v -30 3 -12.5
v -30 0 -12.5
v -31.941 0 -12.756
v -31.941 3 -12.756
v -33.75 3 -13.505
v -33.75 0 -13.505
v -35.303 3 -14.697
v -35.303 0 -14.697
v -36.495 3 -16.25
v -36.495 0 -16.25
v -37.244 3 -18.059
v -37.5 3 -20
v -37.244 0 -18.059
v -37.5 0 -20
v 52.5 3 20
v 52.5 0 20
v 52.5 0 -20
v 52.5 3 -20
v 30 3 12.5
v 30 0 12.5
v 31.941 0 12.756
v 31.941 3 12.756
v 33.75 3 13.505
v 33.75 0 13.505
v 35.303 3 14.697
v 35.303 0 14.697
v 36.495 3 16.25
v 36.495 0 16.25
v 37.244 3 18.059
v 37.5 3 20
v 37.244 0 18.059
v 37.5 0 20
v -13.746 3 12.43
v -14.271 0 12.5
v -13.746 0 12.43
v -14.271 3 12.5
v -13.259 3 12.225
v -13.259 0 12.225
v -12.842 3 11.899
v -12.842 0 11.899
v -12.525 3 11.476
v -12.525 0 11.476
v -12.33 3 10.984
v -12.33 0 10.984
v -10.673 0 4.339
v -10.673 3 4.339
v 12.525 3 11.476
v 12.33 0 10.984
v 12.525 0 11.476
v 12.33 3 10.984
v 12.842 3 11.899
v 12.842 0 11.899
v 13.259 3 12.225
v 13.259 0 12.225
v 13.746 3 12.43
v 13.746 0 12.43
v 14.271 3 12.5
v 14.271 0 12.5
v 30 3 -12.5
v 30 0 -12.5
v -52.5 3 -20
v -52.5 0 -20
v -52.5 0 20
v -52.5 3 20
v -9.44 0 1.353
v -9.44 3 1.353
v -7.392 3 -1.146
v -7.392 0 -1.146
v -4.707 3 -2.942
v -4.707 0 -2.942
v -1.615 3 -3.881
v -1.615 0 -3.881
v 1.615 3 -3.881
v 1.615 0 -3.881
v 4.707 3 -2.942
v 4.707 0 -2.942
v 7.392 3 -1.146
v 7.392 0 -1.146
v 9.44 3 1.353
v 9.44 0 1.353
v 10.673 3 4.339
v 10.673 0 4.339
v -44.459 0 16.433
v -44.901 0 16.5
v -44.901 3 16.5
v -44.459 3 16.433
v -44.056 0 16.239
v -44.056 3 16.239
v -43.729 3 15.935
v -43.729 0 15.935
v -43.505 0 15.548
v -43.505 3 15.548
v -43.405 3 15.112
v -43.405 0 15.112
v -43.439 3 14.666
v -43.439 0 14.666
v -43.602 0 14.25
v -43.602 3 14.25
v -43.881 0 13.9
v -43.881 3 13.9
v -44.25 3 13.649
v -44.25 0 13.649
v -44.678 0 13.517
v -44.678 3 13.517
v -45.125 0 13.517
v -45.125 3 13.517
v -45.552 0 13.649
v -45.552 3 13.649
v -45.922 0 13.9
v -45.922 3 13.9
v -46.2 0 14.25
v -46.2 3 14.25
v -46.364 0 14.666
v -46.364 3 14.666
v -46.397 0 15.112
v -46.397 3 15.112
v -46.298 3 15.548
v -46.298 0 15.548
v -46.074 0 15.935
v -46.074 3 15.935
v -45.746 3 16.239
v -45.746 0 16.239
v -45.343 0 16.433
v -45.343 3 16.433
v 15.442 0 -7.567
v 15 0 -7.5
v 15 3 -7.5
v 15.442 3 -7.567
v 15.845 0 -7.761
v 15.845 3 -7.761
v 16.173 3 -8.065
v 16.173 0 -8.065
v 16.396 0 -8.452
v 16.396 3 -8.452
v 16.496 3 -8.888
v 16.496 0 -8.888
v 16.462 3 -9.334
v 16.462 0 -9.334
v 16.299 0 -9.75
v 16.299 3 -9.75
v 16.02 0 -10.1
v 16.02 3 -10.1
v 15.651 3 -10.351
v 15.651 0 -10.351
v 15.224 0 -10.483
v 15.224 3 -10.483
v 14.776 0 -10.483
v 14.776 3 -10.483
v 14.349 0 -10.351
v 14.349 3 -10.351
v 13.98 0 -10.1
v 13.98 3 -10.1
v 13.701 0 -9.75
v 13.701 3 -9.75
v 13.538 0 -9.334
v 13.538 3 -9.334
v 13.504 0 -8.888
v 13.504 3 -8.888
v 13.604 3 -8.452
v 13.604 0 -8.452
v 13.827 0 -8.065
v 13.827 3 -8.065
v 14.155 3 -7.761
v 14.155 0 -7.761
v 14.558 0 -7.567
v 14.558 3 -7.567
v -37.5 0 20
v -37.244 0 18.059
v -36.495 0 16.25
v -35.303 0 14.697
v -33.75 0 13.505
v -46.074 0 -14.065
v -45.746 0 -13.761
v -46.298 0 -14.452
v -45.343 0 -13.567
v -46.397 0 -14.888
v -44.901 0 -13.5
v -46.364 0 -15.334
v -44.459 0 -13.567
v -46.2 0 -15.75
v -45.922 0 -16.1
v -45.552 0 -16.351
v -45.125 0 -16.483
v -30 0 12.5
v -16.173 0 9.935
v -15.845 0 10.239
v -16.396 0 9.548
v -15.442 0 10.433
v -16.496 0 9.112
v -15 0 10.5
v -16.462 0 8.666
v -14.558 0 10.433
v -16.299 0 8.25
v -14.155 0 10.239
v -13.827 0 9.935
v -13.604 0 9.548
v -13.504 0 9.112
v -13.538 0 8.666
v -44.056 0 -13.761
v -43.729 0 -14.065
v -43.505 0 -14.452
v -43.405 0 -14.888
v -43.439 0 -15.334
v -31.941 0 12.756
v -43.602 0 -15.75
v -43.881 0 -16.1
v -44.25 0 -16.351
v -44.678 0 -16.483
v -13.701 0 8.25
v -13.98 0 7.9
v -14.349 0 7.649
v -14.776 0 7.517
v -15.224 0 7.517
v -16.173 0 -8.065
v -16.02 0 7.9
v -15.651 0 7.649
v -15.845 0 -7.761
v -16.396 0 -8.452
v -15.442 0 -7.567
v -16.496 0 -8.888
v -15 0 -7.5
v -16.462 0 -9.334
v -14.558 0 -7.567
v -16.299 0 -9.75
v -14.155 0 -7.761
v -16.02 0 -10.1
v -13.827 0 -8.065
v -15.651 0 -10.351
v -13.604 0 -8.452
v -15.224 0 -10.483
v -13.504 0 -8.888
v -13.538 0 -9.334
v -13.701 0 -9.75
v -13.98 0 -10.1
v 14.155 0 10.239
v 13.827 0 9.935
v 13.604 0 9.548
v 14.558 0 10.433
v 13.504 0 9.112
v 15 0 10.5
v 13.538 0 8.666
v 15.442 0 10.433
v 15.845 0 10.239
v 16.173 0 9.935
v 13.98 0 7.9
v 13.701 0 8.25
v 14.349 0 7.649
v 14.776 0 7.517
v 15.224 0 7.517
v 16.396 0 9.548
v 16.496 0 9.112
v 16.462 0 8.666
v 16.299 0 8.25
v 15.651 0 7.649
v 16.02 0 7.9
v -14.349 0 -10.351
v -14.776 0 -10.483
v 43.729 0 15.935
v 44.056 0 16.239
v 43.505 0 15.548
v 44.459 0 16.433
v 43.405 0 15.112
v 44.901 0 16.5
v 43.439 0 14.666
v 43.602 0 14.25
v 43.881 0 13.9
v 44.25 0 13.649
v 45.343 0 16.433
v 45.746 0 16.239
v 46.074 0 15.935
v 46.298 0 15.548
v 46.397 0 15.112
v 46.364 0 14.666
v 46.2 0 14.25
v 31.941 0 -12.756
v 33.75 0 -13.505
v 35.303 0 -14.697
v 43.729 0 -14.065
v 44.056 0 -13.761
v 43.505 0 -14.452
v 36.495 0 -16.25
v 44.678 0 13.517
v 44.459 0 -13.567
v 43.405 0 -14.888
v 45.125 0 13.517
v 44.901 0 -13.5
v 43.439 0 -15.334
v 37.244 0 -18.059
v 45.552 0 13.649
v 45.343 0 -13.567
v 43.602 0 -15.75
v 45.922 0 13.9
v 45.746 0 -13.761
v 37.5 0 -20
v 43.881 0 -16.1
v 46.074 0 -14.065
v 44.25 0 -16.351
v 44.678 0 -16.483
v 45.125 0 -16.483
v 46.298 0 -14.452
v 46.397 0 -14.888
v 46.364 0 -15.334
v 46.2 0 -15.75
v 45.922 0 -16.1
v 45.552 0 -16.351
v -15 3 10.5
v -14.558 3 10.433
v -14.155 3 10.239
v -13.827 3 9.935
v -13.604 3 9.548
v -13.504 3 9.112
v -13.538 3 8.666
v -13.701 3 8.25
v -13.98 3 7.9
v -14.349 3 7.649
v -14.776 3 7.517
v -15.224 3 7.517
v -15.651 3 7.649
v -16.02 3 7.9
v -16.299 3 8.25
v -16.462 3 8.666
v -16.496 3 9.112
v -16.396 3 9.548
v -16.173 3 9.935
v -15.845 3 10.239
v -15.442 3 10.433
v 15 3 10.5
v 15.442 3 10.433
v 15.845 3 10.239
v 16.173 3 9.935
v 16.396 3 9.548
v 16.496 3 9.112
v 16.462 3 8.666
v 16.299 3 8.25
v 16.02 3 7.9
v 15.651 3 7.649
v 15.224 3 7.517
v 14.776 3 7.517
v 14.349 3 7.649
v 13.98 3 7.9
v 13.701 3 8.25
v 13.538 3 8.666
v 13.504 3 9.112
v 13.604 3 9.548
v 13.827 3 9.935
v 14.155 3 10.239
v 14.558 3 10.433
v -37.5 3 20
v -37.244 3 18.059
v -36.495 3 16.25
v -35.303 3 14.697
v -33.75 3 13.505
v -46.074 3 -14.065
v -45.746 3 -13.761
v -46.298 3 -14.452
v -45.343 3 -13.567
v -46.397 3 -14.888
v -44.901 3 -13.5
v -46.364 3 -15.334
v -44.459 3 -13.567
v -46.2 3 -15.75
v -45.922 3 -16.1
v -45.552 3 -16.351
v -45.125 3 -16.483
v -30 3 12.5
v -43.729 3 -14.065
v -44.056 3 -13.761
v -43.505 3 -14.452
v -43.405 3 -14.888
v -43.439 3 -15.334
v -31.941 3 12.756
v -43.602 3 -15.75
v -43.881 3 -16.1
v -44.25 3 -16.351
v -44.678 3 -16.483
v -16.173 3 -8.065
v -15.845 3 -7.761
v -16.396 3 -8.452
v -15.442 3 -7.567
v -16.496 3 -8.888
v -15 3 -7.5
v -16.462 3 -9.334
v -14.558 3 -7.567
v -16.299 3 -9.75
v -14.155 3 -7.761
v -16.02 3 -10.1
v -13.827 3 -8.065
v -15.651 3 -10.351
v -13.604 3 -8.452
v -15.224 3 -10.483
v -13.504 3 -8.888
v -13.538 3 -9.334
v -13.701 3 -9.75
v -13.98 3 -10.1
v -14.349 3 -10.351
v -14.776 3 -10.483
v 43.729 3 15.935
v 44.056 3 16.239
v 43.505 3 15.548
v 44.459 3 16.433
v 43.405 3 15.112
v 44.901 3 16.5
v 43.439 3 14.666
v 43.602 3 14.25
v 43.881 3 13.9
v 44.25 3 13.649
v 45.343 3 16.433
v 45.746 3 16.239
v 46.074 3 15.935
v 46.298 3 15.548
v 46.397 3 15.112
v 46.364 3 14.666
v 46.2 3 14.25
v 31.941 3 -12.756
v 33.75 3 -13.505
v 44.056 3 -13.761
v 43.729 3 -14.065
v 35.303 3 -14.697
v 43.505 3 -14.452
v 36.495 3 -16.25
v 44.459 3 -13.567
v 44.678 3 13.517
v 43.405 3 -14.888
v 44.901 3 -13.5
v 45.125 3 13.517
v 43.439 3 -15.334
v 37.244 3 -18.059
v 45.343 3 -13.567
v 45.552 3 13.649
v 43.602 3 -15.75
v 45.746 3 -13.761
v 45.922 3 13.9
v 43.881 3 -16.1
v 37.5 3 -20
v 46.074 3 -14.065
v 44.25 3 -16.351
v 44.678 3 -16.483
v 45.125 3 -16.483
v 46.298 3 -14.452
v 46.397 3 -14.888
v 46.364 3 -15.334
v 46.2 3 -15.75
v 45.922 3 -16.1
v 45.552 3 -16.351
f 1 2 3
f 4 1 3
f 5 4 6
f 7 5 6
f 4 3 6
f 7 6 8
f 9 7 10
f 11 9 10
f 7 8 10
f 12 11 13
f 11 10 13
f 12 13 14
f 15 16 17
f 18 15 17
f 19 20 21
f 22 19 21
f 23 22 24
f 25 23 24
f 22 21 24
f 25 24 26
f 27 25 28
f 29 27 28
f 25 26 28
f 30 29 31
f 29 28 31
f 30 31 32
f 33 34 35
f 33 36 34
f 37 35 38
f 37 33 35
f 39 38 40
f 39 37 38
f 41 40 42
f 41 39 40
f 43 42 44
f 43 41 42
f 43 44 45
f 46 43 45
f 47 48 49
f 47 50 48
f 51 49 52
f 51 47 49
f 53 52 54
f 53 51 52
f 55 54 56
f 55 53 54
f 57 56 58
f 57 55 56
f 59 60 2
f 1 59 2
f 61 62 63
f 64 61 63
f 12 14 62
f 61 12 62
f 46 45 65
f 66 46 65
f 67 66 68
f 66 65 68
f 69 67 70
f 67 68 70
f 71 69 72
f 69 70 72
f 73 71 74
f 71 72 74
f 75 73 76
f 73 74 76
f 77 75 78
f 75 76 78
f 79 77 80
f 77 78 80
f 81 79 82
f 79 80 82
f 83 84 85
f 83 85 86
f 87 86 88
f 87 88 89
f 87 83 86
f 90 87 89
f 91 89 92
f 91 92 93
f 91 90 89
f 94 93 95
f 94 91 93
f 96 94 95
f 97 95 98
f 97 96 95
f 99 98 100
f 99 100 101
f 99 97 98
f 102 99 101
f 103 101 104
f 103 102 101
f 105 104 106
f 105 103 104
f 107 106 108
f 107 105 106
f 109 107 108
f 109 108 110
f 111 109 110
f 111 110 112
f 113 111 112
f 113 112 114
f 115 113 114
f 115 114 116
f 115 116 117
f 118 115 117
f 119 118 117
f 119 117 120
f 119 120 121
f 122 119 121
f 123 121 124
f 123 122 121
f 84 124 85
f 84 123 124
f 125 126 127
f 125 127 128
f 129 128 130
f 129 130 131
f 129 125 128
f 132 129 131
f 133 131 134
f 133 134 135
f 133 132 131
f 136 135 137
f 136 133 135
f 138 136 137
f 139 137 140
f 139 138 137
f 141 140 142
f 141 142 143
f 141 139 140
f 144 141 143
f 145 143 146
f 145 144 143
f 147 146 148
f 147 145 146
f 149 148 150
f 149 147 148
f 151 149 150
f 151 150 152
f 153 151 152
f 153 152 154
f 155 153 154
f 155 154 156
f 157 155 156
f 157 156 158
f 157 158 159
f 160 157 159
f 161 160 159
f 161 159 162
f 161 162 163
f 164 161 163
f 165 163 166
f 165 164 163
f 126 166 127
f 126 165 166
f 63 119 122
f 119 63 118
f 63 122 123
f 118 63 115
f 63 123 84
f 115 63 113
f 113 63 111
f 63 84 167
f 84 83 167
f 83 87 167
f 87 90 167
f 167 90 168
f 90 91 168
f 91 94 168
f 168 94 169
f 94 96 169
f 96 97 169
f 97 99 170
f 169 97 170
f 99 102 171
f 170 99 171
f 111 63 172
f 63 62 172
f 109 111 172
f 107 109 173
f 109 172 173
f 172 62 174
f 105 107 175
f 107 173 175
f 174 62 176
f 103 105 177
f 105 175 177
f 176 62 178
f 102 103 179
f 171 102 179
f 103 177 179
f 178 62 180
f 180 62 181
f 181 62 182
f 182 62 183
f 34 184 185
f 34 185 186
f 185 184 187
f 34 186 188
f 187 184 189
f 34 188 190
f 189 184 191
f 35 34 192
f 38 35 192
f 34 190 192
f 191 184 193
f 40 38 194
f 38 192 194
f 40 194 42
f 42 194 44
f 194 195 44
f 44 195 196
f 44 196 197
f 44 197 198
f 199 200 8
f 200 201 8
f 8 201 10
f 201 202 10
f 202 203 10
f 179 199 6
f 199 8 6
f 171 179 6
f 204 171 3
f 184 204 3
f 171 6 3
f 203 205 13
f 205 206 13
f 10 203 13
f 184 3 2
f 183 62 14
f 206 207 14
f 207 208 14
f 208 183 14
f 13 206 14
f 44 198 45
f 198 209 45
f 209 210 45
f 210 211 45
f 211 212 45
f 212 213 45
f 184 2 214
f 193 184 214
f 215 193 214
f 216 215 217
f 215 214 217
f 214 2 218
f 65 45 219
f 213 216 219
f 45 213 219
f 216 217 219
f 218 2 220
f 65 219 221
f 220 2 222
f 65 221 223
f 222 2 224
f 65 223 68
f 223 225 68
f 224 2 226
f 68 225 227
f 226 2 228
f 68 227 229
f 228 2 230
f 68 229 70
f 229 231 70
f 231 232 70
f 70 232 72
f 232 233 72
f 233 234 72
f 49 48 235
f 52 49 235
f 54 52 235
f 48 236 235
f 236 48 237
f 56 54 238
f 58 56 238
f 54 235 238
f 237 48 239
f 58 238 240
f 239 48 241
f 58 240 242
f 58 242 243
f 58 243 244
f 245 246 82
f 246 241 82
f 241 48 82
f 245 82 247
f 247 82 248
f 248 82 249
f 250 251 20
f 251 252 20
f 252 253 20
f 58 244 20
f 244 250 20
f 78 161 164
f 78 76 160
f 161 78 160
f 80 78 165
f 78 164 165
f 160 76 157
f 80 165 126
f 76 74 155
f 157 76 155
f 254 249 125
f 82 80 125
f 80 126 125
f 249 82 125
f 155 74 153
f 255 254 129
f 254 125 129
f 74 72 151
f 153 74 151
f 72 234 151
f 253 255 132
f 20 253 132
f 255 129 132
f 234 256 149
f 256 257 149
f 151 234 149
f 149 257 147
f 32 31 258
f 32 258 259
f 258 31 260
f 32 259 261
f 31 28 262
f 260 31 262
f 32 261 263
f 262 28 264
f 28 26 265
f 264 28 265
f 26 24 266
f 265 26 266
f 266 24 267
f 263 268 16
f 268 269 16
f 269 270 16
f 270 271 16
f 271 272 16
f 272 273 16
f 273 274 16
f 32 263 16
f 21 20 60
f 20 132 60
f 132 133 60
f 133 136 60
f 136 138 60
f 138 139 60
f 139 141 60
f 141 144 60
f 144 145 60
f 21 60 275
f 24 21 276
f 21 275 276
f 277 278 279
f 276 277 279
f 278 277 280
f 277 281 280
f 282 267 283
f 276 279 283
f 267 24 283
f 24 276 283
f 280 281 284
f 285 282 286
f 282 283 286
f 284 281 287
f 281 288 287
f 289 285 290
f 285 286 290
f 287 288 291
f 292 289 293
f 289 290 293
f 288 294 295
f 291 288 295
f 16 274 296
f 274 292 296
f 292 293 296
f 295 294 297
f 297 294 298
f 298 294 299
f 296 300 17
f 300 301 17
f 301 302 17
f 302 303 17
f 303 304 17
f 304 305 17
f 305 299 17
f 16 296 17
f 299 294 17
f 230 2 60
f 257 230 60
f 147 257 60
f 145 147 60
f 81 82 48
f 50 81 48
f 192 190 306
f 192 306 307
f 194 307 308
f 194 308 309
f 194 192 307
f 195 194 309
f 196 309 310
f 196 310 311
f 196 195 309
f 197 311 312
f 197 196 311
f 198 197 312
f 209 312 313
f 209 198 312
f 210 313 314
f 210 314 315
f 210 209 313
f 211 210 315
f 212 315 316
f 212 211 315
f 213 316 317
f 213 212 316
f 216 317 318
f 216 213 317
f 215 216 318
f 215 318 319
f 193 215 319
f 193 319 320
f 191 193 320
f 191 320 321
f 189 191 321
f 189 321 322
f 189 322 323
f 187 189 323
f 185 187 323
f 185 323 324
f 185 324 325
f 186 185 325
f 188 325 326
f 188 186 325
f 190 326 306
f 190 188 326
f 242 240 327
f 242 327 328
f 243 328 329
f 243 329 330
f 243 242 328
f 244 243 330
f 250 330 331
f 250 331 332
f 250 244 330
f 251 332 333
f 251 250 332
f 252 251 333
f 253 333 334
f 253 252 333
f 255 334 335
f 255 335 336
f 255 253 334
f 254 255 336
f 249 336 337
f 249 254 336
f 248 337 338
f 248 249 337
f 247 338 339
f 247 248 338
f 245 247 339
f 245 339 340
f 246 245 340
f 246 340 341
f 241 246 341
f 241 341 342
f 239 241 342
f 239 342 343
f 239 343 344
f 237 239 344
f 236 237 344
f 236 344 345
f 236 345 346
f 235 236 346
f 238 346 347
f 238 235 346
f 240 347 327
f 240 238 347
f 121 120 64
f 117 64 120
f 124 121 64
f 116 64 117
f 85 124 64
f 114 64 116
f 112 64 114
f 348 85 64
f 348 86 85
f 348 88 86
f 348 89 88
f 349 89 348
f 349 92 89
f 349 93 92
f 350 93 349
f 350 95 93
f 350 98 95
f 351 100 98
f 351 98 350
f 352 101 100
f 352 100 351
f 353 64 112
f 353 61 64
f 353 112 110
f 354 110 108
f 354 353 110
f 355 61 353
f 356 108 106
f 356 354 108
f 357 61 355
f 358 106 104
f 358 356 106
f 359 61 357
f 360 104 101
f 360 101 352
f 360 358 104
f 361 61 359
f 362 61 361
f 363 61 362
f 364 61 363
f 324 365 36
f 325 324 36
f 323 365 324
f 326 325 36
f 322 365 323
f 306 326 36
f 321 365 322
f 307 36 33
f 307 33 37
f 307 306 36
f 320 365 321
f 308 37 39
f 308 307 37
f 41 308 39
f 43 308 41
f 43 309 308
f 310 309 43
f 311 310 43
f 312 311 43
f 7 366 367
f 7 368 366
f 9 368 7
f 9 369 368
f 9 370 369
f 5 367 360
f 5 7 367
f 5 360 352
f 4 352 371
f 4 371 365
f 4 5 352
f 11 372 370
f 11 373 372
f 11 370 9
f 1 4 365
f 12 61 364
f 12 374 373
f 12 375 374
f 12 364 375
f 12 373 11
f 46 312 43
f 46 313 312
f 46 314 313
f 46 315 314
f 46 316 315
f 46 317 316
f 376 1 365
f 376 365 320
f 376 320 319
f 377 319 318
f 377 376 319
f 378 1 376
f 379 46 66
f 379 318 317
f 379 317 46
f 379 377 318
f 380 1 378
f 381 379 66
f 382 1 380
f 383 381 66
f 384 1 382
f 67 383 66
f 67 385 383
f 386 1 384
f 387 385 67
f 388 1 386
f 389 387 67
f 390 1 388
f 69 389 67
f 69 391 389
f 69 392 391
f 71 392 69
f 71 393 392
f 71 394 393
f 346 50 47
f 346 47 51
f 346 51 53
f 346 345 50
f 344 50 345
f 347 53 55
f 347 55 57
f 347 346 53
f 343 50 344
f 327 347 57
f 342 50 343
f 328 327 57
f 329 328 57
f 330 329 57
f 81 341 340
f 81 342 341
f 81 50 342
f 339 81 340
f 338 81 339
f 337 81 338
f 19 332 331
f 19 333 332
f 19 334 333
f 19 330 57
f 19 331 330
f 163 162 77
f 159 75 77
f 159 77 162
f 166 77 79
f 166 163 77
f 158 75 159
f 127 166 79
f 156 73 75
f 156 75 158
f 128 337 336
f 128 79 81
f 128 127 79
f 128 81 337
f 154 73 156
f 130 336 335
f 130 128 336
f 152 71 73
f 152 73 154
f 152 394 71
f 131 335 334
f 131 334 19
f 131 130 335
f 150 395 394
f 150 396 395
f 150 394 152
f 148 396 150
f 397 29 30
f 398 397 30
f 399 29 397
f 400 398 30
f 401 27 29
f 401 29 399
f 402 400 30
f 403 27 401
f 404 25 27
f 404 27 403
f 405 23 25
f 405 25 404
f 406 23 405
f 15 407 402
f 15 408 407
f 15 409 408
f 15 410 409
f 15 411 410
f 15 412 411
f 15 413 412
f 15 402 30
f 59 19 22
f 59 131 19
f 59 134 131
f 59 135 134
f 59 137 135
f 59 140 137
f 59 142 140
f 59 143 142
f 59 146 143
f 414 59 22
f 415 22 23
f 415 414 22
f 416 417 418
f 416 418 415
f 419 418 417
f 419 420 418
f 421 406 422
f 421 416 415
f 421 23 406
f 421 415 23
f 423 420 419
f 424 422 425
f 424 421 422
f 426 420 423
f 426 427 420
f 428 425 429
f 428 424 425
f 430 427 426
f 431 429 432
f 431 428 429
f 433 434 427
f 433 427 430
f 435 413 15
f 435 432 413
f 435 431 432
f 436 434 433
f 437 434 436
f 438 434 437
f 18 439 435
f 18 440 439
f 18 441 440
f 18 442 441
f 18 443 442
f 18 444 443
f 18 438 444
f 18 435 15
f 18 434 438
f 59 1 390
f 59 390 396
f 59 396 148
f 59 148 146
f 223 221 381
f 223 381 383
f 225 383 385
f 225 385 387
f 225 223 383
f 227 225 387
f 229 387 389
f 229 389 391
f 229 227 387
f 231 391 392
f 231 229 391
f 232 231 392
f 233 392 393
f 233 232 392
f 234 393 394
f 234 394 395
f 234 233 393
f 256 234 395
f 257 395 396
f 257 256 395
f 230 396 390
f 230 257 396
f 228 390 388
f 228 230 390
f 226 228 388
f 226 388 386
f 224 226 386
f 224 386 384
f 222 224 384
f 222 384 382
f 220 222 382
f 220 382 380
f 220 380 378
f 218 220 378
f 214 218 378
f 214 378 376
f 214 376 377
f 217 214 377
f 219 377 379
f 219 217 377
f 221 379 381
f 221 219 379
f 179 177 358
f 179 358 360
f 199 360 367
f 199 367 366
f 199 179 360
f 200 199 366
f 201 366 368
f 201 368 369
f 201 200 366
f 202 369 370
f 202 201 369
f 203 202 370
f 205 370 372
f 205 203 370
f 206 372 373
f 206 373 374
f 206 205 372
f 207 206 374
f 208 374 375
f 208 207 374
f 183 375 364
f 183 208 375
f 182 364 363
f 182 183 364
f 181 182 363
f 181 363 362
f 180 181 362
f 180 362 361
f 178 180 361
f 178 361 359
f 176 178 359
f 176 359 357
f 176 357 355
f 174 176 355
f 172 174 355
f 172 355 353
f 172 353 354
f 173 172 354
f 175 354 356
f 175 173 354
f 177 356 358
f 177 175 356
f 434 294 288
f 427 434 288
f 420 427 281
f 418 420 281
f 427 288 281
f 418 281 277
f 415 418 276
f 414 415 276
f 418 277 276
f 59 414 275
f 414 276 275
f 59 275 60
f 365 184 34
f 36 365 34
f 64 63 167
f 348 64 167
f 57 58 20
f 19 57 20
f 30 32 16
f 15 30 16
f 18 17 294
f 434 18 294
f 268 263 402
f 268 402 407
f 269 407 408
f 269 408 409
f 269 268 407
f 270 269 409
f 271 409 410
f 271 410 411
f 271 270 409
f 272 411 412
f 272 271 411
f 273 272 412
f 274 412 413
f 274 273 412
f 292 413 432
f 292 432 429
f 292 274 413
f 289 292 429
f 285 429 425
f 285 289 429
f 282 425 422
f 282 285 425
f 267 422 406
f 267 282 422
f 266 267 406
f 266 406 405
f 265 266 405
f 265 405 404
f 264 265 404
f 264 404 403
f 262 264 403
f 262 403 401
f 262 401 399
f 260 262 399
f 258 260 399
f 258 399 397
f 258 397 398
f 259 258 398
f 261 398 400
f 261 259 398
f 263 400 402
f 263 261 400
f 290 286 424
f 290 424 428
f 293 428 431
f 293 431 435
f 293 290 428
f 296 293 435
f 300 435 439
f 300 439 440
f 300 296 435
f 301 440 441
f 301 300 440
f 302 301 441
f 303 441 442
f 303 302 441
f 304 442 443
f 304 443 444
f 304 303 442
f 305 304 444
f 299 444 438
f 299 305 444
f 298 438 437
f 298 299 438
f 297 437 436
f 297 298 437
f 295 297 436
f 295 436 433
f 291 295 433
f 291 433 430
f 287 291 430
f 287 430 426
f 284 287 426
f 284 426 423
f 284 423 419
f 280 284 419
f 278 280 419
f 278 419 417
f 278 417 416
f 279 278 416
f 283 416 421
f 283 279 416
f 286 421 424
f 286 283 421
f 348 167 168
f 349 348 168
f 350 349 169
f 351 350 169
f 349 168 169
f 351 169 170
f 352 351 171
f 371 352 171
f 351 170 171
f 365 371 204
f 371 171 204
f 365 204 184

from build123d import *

# Parameters (mm, degrees)
SKETCH_1_R      = 1.5
EXTRUDE_1_DEPTH = 3
FILLET_1_R      = 2


with BuildPart() as part:
    # 草图1 → 凸台-拉伸1 (new body)
    with BuildSketch(Plane(origin=(0, 0, 0), x_dir=(1, 0, 0), z_dir=(0, 1, 0))):
        with BuildLine():
            Line((-52.5, 20), (-52.5, -20))
            Line((-52.5, -20), (-37.5, -20))
            ThreePointArc((-37.5, -20), (-35.303300859, -14.696699141), (-30, -12.5))
            Line((-30, -12.5), (-12.708053938, -12.5))
            Line((-12.708053938, -12.5), (-10.673252989, -4.338859148))
            ThreePointArc((-10.673252989, -4.338859148), (0, 4), (10.673252989, -4.338859148))
            Line((10.673252989, -4.338859148), (12.708053938, -12.5))
            Line((12.708053938, -12.5), (30, -12.5))
            ThreePointArc((30, -12.5), (35.303300859, -14.696699141), (37.5, -20))
            Line((37.5, -20), (52.5, -20))
            Line((52.5, -20), (52.5, 20))
            Line((52.5, 20), (37.5, 20))
            ThreePointArc((37.5, 20), (35.303300859, 14.696699141), (30, 12.5))
            Line((30, 12.5), (-30, 12.5))
            ThreePointArc((-30, 12.5), (-35.303300859, 14.696699141), (-37.5, 20))
            Line((-37.5, 20), (-52.5, 20))
        make_face()
        with Locations(Location((-44.901280605, 15, 0), (0, 0, 270))):
            Circle(SKETCH_1_R, mode=Mode.SUBTRACT)
        with Locations(Location((-44.901280605, -15, 0), (0, 0, 270))):
            Circle(SKETCH_1_R, mode=Mode.SUBTRACT)
        with Locations(Location((44.901280605, -15, 0), (0, 0, 270))):
            Circle(SKETCH_1_R, mode=Mode.SUBTRACT)
        with Locations(Location((44.901280605, 15, 0), (0, 0, 270))):
            Circle(SKETCH_1_R, mode=Mode.SUBTRACT)
        with Locations(Location((15, 9, 0), (0, 0, 270))):
            Circle(SKETCH_1_R, mode=Mode.SUBTRACT)
        with Locations(Location((15, -9, 0), (0, 0, 270))):
            Circle(SKETCH_1_R, mode=Mode.SUBTRACT)
        with Locations(Location((-15, 9, 0), (0, 0, 270))):
            Circle(SKETCH_1_R, mode=Mode.SUBTRACT)
        with Locations(Location((-15, -9, 0), (0, 0, 270))):
            Circle(SKETCH_1_R, mode=Mode.SUBTRACT)
    extrude(amount=EXTRUDE_1_DEPTH)

    # 圆角1
    fillet_1_edges = [part.edges().sort_by_distance(p)[0] for p in [
        (12.708053938, 1.5, 12.5),
        (-12.708053938, 1.5, 12.5),
    ]]
    fillet(fillet_1_edges, radius=FILLET_1_R)


solid = part.part
